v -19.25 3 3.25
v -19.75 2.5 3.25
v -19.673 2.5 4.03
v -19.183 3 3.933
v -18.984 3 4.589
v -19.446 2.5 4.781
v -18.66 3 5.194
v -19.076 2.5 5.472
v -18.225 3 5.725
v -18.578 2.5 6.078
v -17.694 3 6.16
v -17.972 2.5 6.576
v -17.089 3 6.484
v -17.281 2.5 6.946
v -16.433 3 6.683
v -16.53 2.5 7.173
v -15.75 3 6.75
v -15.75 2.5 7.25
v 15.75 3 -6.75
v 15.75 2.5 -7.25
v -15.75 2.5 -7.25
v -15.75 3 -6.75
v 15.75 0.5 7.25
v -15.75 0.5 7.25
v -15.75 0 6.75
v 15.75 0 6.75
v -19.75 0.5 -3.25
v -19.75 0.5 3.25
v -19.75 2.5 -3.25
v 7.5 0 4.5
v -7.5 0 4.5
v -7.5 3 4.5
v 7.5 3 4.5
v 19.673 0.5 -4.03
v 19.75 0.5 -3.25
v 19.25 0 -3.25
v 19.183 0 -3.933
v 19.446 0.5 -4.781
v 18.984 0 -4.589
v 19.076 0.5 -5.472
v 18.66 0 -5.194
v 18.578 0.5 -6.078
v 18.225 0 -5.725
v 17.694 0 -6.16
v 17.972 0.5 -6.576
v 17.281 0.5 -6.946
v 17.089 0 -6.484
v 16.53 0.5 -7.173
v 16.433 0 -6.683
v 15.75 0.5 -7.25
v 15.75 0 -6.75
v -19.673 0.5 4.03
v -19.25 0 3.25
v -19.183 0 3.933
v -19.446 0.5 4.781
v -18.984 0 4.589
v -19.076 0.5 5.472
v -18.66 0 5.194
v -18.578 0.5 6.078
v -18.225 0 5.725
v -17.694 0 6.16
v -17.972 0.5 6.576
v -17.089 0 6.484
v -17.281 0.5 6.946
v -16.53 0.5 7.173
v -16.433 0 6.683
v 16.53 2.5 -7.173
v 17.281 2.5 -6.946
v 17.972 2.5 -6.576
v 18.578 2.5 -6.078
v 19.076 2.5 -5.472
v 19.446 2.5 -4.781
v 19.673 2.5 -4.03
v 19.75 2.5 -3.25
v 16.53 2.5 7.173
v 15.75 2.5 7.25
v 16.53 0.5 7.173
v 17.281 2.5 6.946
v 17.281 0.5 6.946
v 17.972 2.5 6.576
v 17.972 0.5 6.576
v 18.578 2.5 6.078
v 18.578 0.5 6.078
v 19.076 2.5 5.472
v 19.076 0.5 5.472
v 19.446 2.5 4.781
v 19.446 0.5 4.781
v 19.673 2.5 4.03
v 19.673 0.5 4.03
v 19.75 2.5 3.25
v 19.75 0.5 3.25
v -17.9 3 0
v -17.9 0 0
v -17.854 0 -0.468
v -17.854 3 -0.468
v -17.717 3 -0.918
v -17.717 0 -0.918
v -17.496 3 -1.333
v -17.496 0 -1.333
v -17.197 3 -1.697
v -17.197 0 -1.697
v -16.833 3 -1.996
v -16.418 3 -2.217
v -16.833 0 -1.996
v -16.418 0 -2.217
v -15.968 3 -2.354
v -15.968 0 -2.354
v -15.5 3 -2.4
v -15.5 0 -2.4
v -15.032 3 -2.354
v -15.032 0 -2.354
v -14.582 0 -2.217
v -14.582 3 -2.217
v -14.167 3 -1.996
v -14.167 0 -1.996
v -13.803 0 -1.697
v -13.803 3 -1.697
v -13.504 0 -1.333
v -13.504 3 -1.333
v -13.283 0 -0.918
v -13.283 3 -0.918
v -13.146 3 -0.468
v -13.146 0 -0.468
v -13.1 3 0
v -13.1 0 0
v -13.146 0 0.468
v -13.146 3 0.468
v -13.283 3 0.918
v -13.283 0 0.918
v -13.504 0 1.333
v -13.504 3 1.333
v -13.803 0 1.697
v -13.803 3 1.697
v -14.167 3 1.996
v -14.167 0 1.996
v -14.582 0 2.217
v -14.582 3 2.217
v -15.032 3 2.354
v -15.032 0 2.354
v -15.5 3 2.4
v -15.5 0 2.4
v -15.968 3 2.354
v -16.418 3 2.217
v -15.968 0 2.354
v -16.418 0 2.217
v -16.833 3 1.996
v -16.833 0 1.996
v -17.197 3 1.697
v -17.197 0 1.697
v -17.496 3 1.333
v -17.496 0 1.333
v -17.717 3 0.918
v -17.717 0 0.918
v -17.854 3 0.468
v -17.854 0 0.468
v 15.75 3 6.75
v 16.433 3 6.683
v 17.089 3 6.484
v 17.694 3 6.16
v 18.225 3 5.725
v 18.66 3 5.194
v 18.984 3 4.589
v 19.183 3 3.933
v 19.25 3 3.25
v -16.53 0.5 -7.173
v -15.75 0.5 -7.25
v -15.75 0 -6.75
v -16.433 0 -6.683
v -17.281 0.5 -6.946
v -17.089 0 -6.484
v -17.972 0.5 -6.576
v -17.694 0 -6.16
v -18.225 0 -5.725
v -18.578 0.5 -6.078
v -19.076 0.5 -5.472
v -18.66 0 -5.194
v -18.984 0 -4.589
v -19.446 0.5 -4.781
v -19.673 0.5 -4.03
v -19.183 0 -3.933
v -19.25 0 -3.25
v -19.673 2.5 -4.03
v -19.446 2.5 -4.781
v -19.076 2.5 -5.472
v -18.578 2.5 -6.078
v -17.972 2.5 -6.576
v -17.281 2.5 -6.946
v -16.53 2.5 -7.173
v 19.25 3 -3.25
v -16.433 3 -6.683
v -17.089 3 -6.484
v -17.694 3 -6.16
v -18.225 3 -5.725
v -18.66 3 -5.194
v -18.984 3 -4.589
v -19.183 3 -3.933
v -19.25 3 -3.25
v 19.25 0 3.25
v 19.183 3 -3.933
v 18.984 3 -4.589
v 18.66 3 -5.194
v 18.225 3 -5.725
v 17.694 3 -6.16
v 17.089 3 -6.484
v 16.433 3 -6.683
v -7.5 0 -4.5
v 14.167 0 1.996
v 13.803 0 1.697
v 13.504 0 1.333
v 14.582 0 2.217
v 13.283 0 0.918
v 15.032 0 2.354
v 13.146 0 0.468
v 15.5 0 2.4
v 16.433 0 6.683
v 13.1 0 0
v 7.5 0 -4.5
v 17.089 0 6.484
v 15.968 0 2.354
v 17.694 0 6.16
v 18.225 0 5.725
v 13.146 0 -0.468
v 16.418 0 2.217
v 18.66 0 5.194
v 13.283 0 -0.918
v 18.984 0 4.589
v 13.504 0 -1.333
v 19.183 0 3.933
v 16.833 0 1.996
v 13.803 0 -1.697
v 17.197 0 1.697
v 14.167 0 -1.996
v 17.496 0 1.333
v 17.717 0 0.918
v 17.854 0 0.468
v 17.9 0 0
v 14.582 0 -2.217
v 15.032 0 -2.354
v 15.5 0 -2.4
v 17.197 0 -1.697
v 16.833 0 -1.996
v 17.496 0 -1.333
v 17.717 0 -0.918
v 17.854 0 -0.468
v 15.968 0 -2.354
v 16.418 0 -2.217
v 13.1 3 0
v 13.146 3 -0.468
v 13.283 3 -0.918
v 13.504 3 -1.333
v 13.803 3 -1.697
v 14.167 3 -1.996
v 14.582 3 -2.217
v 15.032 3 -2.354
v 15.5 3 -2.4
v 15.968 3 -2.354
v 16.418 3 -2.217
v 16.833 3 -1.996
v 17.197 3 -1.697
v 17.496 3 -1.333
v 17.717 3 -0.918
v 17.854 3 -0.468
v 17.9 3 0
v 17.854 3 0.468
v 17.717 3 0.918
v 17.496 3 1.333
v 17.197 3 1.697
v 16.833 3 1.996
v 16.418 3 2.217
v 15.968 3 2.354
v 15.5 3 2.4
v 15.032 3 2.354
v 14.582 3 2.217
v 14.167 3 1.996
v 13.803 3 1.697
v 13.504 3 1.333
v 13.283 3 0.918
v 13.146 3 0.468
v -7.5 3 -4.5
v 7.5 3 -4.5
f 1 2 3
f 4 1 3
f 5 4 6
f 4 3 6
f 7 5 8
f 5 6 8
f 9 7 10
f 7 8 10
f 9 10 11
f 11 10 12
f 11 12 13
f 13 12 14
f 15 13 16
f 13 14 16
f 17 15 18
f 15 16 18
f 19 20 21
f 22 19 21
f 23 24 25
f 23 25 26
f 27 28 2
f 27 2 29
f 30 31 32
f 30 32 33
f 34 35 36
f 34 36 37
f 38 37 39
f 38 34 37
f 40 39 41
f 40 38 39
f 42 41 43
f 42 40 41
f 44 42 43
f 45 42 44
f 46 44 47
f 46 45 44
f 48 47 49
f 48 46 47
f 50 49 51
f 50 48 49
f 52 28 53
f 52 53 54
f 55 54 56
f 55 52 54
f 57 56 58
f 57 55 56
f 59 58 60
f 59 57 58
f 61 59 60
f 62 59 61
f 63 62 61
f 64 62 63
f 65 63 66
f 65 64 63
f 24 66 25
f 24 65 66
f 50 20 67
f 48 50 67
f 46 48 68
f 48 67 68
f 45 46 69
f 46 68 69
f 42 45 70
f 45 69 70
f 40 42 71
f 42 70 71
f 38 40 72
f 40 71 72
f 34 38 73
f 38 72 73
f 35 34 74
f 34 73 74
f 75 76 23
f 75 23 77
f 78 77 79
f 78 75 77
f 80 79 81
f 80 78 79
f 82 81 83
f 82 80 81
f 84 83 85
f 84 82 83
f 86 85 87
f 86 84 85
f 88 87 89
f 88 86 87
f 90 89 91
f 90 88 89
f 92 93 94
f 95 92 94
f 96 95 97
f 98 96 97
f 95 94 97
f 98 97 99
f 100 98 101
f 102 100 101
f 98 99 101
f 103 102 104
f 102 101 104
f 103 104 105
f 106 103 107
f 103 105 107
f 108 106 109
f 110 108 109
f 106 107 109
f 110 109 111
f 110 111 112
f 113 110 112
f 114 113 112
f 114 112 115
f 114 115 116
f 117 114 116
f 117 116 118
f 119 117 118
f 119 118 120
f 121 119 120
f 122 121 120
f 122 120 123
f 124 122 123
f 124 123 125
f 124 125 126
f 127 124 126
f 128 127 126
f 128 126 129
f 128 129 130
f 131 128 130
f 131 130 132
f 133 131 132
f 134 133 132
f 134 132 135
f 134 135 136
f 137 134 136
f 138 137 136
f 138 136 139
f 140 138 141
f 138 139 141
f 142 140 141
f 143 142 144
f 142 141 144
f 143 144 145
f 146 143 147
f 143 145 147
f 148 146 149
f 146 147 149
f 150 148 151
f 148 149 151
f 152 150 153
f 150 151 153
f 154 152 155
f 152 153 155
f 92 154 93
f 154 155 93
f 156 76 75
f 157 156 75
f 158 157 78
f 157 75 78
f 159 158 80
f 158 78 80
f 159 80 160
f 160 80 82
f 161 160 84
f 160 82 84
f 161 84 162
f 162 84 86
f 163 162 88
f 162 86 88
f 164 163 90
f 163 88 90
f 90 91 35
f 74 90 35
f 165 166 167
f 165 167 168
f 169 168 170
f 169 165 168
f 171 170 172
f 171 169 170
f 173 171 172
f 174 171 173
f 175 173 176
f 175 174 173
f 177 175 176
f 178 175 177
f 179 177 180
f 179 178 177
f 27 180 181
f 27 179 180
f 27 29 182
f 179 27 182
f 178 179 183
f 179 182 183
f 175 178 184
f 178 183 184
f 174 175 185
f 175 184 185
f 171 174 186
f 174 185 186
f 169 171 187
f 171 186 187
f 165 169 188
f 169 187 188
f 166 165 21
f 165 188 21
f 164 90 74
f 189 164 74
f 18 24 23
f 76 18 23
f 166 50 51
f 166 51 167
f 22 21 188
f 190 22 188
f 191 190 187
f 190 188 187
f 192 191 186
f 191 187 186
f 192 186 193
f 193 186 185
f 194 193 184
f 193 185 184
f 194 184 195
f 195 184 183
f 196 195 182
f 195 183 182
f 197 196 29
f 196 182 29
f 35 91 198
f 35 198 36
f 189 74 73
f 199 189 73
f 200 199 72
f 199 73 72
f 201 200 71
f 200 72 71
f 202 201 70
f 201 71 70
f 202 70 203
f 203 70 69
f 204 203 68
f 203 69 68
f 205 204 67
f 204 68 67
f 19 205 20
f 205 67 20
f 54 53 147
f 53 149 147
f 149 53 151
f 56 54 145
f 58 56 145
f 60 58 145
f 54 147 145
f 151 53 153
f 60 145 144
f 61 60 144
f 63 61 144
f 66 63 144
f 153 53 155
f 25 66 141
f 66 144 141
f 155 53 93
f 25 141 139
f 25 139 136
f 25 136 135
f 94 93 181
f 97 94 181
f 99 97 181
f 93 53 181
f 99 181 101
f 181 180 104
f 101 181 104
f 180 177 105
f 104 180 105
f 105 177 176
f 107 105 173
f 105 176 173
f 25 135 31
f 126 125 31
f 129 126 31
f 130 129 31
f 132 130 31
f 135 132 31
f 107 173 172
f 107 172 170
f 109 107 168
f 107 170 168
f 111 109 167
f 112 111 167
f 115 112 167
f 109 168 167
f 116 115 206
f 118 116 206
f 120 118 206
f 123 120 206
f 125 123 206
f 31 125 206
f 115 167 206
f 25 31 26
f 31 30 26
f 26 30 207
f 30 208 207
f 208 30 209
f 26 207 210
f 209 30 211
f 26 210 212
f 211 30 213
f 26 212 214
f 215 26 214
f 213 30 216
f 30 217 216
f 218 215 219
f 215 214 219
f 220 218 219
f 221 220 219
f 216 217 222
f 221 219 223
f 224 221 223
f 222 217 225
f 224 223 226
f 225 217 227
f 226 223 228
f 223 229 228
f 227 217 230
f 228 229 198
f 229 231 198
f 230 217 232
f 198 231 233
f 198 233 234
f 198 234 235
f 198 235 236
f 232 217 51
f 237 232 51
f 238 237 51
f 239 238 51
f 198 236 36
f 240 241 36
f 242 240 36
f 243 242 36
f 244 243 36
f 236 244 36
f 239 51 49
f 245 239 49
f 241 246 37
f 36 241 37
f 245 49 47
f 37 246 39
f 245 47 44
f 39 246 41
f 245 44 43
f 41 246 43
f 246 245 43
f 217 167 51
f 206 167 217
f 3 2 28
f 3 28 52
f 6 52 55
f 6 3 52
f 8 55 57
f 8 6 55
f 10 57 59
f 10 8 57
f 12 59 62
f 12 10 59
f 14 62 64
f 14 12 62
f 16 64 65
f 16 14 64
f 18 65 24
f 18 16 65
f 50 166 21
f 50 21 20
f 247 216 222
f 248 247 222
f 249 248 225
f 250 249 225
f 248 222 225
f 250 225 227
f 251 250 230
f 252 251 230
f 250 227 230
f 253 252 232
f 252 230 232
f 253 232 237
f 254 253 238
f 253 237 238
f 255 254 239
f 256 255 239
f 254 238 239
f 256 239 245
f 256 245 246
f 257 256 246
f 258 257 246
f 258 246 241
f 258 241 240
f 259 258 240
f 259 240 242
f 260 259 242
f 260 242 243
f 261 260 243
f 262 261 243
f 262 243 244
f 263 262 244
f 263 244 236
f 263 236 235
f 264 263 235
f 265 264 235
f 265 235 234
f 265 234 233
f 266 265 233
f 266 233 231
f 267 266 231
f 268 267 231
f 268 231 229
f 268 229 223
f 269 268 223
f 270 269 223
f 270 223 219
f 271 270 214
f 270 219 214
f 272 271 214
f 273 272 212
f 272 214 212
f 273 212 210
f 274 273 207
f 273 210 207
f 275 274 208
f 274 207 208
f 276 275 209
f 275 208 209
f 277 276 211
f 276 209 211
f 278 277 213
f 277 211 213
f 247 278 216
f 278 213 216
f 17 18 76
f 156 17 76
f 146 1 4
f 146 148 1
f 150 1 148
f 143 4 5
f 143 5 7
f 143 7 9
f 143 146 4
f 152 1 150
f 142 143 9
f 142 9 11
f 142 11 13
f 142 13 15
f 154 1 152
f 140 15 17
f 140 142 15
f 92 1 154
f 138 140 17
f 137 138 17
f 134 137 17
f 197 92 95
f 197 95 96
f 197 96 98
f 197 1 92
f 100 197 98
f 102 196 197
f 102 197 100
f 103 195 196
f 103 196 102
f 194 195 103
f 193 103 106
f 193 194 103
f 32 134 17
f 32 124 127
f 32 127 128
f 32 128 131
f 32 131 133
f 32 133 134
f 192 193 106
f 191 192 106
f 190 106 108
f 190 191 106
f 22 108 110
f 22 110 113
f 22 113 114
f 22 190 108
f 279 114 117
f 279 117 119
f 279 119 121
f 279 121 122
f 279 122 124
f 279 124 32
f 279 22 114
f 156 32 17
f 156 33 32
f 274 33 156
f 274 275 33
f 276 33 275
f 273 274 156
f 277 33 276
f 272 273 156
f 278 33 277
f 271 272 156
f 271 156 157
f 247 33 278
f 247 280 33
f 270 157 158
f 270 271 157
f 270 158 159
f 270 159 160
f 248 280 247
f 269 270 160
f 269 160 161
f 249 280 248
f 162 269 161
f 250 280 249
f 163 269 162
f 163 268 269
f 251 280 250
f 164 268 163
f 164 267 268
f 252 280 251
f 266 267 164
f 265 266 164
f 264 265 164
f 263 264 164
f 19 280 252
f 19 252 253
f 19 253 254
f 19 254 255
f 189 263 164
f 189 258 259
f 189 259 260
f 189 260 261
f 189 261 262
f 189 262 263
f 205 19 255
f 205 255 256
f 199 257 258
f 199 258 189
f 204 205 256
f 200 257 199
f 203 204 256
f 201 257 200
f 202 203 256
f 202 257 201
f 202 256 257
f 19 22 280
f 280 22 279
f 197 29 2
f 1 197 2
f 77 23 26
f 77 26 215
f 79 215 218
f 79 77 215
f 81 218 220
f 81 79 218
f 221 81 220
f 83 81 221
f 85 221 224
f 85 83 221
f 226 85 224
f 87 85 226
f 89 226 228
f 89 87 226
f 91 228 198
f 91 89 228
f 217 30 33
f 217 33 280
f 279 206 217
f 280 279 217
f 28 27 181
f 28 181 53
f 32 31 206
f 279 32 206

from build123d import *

# Parameters (mm, degrees)
SKETCH1_W            = 39.5
SKETCH1_H            = 14.5
SKETCH1_W_2          = 15
SKETCH1_H_2          = 9
BOSS_EXTRUDE1_DEPTH  = 3
FILLET1_R            = 4
M4_CLEARANCE_HOLE1_D = 4.8
CHAMFER1_SIZE        = 0.5


with BuildPart() as part:
    # Sketch1 → Boss-Extrude1 (new body)
    with BuildSketch(Plane(origin=(0, 0, 0), x_dir=(1, 0, 0), z_dir=(0, 1, 0))):
        Rectangle(SKETCH1_W, SKETCH1_H)
        Rectangle(SKETCH1_W_2, SKETCH1_H_2, mode=Mode.SUBTRACT)
    extrude(amount=BOSS_EXTRUDE1_DEPTH)

    # Fillet1
    fillet1_edges = [part.edges().sort_by_distance(p)[0] for p in [
        (19.75, 1.5, 7.25),
        (-19.75, 1.5, 7.25),
        (-19.75, 1.5, -7.25),
        (19.75, 1.5, -7.25),
    ]]
    fillet(fillet1_edges, radius=FILLET1_R)

    # M4 Clearance Hole1 (through all)
    with Locations(Plane(origin=(0, 3, 0), x_dir=(1, 0, 0), z_dir=(0, 1, 0))):
        with Locations((-15.5, 0), (15.5, 0)):
            Hole(M4_CLEARANCE_HOLE1_D / 2)

    # Chamfer1
    chamfer1_edges = [part.edges().sort_by_distance(p)[0] for p in [
        (19.75, 0, 0),
        (19.75, 3, 0),
        (0, 0, 7.25),
        (-19.75, 0, 0),
        (0, 0, -7.25),
        (-18.578427125, 0, -6.078427125),
        (-18.578427125, 0, 6.078427125),
        (18.578427125, 0, -6.078427125),
        (18.578427125, 0, 6.078427125),
        (0, 3, 7.25),
        (0, 3, -7.25),
        (-19.75, 3, 0),
        (-18.578427125, 3, -6.078427125),
        (-18.578427125, 3, 6.078427125),
        (18.578427125, 3, -6.078427125),
        (18.578427125, 3, 6.078427125),
    ]]
    chamfer(chamfer1_edges, length=CHAMFER1_SIZE)


solid = part.part
